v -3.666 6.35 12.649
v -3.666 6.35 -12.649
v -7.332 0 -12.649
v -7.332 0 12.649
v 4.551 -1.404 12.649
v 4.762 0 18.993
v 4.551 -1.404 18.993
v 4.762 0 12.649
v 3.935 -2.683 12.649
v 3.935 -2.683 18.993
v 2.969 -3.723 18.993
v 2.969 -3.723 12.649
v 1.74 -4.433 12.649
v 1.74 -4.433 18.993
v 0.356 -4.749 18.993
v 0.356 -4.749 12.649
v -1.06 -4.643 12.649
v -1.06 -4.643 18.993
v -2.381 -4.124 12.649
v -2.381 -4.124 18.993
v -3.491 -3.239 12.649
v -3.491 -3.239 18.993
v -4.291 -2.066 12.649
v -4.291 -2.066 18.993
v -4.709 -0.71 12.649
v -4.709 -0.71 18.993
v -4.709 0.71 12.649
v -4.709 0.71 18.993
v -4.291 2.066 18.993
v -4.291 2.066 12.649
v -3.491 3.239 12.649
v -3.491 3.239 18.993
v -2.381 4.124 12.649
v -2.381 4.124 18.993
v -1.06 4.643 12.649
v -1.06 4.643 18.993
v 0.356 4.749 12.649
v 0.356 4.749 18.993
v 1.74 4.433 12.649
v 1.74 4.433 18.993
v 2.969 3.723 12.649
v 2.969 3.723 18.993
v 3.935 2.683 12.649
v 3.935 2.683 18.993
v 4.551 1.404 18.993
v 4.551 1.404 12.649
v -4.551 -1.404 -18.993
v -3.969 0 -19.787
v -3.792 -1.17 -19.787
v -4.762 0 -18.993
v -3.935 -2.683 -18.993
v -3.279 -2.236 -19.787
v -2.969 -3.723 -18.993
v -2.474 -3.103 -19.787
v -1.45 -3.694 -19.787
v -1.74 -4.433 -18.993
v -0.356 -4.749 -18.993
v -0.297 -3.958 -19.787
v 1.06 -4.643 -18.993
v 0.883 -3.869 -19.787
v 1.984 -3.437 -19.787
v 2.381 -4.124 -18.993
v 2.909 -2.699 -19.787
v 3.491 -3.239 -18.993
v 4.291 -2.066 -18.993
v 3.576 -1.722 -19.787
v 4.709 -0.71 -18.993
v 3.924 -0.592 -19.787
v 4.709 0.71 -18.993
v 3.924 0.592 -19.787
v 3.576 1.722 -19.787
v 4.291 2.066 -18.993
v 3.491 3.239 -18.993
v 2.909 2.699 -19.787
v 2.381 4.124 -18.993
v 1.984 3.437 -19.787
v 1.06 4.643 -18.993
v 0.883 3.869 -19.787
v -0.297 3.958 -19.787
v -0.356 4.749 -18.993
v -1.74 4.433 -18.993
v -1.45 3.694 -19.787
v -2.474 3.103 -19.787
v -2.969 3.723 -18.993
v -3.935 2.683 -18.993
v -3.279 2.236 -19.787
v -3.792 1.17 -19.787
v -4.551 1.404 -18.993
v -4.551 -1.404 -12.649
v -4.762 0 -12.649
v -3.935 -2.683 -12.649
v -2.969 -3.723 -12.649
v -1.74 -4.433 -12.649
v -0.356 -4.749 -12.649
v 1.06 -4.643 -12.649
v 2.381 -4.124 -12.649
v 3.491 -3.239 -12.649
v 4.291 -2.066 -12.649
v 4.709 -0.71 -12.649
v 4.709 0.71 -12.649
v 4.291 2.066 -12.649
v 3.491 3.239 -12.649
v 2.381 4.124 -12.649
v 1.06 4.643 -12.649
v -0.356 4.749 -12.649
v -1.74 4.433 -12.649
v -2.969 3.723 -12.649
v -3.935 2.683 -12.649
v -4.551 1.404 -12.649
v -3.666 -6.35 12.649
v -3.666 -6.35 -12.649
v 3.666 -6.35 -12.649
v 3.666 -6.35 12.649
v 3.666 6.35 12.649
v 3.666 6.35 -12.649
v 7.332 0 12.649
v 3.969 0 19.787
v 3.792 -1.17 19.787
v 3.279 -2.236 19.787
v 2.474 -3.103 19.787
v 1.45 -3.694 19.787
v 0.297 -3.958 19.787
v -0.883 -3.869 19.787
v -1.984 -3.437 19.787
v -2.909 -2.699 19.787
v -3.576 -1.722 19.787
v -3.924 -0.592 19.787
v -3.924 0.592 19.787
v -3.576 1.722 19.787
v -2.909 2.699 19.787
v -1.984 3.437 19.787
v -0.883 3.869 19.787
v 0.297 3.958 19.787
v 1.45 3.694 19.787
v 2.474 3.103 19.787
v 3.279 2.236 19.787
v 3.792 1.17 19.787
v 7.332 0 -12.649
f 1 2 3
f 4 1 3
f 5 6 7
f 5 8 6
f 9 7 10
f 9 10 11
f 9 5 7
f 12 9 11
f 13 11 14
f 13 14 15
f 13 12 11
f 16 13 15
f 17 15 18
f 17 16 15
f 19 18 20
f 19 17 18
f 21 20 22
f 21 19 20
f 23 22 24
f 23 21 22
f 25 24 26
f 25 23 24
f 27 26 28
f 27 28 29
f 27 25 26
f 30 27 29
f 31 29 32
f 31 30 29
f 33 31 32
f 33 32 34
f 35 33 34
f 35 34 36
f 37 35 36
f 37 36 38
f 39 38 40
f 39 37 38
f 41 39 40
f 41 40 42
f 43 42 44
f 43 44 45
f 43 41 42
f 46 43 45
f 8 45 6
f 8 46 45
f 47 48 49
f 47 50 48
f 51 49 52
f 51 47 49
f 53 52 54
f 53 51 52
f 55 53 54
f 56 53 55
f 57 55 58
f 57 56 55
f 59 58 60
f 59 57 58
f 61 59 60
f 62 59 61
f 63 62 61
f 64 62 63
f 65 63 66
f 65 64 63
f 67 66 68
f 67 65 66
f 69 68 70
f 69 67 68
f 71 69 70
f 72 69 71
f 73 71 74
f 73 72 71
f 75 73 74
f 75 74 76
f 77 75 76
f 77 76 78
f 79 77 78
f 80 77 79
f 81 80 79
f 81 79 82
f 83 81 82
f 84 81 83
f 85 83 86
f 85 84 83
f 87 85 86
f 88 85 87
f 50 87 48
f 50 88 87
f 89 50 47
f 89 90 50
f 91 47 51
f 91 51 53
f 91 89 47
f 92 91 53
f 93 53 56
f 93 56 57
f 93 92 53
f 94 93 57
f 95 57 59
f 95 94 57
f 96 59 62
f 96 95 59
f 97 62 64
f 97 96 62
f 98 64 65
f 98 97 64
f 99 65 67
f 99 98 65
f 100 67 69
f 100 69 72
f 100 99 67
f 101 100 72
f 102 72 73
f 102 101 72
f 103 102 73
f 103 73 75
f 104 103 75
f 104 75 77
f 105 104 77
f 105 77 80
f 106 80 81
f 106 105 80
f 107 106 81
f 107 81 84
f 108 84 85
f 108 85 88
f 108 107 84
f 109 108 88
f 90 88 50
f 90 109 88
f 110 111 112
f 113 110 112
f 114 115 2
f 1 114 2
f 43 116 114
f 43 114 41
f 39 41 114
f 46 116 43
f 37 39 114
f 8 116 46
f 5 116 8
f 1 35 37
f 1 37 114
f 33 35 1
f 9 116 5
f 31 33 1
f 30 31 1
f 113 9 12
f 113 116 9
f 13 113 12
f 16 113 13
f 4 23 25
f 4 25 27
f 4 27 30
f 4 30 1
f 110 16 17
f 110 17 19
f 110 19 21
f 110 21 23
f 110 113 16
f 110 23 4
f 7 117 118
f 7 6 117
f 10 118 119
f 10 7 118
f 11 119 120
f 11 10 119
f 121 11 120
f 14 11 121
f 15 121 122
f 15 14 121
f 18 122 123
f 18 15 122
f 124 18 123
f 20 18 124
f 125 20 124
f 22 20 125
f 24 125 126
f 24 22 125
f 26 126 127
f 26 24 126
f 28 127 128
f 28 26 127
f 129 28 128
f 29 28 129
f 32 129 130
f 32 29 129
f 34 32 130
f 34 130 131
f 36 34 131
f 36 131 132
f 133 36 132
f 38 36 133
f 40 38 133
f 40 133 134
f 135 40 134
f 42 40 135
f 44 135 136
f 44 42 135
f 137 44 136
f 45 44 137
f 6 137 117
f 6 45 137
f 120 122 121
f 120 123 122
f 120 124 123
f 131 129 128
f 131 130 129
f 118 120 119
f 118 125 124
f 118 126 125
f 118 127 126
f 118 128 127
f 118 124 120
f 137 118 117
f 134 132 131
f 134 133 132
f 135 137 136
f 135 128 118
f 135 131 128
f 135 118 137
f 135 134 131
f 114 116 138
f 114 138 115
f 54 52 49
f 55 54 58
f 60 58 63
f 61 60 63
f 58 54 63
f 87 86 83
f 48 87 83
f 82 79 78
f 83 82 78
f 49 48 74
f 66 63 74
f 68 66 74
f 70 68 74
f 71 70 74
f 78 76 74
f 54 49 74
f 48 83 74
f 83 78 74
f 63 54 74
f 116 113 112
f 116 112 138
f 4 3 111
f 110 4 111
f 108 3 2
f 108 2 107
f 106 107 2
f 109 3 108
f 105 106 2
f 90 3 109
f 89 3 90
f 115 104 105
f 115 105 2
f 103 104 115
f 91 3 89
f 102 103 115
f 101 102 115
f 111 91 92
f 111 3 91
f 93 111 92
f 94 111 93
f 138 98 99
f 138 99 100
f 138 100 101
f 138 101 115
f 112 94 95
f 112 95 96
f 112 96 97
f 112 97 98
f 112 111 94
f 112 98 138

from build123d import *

# Parameters (mm, degrees)
EXTRUSI_N_HEX_PROFILE_DEPTH = 19.7866


with BuildPart() as part:
    # Croquis2 → Extrusión Hex Profile (new, symmetric)
    with BuildSketch(Plane.XY):
        Polygon((3.666174209, -6.35), (7.332348419, 0), (3.666174209, 6.35), (-3.666174209, 6.35), (-7.332348419, 0), (-3.666174209, -6.35), align=None)
    extrude(amount=EXTRUSI_N_HEX_PROFILE_DEPTH, both=True)

    # Croquis10 → Round End 1 (revolve, cut)
    with BuildSketch(Plane(origin=(0, 0, 0), x_dir=(1, 0, 0), z_dir=(0, 1, 0))):
        Polygon((-3.96875, -19.7866), (-4.7625, -18.99285), (-4.7625, -12.6492), (-9.525, -12.6492), (-9.525, -19.7866), align=None)
    revolve(axis=Axis((0, 0, 19.7866), (0, 0, -1)), mode=Mode.SUBTRACT)

    # Croquis12 → Round End 2 (revolve, cut)
    with BuildSketch(Plane.XZ):
        Polygon((-3.96875, -19.7866), (-4.7625, -18.99285), (-4.7625, -12.6492), (-9.525, -12.6492), (-9.525, -19.7866), align=None)
    revolve(axis=Axis((0, 0, -19.7866), (0, 0, 1)), mode=Mode.SUBTRACT)


solid = part.part
